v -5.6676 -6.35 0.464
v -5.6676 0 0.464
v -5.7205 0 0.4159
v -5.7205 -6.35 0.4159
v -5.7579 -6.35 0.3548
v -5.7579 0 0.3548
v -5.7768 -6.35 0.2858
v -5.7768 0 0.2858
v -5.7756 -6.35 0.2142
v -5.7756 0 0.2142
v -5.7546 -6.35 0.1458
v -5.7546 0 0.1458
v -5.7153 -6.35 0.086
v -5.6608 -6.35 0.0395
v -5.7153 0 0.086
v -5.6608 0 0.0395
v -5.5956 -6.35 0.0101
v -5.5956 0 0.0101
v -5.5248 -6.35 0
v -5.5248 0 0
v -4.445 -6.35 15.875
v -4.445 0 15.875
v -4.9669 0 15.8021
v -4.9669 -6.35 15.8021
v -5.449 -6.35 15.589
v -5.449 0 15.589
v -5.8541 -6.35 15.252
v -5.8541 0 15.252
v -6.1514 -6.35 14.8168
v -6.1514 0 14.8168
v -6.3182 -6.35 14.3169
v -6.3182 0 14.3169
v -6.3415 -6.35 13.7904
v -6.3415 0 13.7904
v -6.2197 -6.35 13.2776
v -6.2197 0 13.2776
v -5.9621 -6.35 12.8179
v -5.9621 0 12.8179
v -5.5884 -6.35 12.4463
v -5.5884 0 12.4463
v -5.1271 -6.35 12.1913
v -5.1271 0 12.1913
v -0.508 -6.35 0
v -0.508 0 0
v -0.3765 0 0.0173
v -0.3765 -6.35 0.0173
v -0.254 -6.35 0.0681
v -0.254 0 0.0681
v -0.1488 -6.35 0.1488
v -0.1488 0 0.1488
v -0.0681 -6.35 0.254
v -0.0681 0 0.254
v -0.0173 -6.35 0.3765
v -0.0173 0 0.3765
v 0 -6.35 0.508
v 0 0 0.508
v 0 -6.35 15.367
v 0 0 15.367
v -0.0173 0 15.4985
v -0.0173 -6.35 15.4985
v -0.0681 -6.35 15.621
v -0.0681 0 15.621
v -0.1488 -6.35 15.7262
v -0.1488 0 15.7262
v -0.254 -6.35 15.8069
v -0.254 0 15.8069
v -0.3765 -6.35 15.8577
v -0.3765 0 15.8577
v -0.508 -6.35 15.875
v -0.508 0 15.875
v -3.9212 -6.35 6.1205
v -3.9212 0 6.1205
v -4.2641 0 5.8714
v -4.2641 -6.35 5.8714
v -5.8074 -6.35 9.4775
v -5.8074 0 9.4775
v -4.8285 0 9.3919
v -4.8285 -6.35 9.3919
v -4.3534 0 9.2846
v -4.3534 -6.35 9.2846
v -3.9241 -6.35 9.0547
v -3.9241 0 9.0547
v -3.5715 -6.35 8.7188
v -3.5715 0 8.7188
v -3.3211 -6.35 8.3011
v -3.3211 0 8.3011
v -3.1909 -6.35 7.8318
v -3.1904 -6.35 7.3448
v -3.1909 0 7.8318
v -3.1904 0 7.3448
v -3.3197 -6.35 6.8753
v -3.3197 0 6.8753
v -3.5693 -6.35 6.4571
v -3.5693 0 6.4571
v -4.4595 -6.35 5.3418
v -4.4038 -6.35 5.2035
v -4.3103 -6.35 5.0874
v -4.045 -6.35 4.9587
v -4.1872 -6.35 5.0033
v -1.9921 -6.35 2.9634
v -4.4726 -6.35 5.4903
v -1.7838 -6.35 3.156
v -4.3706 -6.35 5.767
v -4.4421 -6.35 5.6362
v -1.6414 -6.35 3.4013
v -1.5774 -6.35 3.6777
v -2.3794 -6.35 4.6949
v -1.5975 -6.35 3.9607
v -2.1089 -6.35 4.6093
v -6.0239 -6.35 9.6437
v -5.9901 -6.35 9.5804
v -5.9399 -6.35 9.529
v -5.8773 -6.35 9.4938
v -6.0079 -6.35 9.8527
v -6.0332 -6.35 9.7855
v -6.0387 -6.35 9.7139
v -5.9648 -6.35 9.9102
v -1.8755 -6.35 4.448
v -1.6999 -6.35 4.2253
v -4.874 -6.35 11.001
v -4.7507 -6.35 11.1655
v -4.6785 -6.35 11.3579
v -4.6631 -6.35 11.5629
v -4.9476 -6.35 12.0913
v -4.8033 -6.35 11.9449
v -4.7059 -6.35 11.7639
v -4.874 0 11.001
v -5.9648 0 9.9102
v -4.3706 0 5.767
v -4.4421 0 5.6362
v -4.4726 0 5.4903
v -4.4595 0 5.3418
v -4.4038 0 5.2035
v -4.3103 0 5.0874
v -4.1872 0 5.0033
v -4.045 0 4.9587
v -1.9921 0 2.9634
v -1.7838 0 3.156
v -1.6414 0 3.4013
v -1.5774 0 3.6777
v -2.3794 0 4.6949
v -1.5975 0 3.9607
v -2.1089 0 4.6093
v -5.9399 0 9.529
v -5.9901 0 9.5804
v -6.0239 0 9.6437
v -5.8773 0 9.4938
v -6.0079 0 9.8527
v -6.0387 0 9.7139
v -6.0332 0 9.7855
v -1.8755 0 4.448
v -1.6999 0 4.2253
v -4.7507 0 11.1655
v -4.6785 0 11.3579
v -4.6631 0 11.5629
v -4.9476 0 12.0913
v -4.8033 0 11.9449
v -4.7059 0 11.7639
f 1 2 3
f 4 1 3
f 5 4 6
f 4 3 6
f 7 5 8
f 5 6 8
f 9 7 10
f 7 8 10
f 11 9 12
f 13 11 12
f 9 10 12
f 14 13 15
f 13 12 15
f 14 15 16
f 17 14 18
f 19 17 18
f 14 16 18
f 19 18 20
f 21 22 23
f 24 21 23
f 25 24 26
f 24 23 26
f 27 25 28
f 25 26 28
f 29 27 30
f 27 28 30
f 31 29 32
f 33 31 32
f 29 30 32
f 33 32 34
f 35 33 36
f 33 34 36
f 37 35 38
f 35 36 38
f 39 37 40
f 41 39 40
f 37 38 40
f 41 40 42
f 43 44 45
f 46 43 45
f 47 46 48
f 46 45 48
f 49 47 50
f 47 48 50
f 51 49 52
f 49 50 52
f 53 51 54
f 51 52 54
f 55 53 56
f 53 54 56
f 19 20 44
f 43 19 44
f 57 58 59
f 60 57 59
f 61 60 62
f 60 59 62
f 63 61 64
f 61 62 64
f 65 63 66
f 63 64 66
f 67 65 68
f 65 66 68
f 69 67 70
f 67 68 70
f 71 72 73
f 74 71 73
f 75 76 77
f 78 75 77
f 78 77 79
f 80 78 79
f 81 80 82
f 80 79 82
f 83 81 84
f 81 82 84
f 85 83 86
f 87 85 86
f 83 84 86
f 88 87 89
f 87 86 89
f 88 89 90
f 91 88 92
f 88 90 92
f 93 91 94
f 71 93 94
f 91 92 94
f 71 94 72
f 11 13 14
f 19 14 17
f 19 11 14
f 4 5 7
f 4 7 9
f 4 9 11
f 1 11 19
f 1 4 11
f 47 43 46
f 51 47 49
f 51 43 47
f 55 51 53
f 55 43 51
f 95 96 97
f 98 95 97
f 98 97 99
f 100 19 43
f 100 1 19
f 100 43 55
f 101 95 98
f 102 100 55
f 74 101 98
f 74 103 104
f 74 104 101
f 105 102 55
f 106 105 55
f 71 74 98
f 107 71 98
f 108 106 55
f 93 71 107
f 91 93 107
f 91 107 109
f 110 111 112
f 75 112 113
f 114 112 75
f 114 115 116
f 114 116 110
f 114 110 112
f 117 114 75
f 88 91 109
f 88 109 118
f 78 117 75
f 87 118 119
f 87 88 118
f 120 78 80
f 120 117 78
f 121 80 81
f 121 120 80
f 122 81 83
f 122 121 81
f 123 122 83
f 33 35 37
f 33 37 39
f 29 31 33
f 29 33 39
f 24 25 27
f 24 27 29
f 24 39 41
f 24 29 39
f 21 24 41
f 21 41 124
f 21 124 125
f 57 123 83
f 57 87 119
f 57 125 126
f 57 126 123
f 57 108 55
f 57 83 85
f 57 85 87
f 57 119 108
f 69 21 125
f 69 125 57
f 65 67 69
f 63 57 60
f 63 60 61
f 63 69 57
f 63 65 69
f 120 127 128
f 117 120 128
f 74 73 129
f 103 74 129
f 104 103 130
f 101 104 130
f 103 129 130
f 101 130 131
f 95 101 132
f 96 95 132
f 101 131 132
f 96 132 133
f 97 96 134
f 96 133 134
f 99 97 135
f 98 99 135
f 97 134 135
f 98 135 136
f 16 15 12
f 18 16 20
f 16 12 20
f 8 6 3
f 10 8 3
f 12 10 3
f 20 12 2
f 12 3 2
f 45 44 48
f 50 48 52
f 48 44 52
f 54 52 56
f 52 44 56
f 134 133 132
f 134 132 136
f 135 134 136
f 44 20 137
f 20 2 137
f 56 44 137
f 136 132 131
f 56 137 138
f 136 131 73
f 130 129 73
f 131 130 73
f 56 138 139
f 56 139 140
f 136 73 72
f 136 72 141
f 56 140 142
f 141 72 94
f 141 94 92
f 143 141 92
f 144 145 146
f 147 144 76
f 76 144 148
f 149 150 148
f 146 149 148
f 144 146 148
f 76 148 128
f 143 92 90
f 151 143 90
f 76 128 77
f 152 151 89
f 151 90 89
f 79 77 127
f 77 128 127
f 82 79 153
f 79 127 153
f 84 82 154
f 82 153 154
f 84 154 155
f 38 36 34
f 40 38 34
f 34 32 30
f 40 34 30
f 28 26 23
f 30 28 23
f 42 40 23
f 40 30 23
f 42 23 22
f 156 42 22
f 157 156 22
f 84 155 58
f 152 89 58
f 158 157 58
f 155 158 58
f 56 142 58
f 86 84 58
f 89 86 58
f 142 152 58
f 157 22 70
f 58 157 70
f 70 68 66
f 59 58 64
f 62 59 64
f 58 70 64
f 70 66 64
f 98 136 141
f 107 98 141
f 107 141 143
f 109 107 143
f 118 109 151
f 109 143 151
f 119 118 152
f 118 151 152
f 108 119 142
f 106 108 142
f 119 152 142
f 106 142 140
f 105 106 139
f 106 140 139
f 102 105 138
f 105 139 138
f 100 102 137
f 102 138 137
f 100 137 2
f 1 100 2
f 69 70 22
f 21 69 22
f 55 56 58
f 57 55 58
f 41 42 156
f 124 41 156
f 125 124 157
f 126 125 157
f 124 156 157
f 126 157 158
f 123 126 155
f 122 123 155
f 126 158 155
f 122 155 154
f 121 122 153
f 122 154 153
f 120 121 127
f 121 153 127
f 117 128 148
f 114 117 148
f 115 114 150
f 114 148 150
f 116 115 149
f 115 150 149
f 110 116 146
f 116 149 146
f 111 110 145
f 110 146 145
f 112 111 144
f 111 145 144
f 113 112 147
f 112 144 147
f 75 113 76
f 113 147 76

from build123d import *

# Parameters (mm, degrees)
F1_DEPTH = 6.35


with BuildPart() as f1:
    # F0 (on Front) → F1 (new body)
    with BuildSketch(Plane.XZ):
        with BuildLine():
            Line((-5.524762, 0), (-0.508, 0))
            ThreePointArc((-0.508, 0), (-0.14879, 0.14879), (0, 0.508))
            Line((0, 0.508), (0, 15.367))
            ThreePointArc((0, 15.367), (-0.14879, 15.72621), (-0.508, 15.875))
            Line((-0.508, 15.875), (-4.445, 15.875))
            ThreePointArc((-4.445, 15.875), (-6.318154, 14.316871), (-5.127144, 12.191319))
            ThreePointArc((-5.127144, 12.191319), (-4.677356, 11.664932), (-4.873952, 11.001048))
            Line((-4.873952, 11.001048), (-5.964836, 9.910164))
            ThreePointArc((-5.964836, 9.910164), (-6.023912, 9.643686), (-5.807368, 9.477526))
            Line((-5.807368, 9.477526), (-4.828483, 9.391884))
            ThreePointArc((-4.828483, 9.391884), (-3.240143, 8.070876), (-3.921246, 6.120495))
            Line((-3.921246, 6.120495), (-4.264111, 5.871389))
            ThreePointArc((-4.264111, 5.871389), (-4.45948, 5.341818), (-4.044985, 4.958663))
            Line((-4.044985, 4.958663), (-2.379395, 4.694859))
            ThreePointArc((-2.379395, 4.694859), (-1.597478, 3.960691), (-1.992111, 2.963365))
            Line((-1.992111, 2.963365), (-5.667589, 0.464039))
            ThreePointArc((-5.667589, 0.464039), (-5.767524, 0.17928), (-5.524762, 0))
        make_face()
    extrude(amount=F1_DEPTH)


solid = f1.part
